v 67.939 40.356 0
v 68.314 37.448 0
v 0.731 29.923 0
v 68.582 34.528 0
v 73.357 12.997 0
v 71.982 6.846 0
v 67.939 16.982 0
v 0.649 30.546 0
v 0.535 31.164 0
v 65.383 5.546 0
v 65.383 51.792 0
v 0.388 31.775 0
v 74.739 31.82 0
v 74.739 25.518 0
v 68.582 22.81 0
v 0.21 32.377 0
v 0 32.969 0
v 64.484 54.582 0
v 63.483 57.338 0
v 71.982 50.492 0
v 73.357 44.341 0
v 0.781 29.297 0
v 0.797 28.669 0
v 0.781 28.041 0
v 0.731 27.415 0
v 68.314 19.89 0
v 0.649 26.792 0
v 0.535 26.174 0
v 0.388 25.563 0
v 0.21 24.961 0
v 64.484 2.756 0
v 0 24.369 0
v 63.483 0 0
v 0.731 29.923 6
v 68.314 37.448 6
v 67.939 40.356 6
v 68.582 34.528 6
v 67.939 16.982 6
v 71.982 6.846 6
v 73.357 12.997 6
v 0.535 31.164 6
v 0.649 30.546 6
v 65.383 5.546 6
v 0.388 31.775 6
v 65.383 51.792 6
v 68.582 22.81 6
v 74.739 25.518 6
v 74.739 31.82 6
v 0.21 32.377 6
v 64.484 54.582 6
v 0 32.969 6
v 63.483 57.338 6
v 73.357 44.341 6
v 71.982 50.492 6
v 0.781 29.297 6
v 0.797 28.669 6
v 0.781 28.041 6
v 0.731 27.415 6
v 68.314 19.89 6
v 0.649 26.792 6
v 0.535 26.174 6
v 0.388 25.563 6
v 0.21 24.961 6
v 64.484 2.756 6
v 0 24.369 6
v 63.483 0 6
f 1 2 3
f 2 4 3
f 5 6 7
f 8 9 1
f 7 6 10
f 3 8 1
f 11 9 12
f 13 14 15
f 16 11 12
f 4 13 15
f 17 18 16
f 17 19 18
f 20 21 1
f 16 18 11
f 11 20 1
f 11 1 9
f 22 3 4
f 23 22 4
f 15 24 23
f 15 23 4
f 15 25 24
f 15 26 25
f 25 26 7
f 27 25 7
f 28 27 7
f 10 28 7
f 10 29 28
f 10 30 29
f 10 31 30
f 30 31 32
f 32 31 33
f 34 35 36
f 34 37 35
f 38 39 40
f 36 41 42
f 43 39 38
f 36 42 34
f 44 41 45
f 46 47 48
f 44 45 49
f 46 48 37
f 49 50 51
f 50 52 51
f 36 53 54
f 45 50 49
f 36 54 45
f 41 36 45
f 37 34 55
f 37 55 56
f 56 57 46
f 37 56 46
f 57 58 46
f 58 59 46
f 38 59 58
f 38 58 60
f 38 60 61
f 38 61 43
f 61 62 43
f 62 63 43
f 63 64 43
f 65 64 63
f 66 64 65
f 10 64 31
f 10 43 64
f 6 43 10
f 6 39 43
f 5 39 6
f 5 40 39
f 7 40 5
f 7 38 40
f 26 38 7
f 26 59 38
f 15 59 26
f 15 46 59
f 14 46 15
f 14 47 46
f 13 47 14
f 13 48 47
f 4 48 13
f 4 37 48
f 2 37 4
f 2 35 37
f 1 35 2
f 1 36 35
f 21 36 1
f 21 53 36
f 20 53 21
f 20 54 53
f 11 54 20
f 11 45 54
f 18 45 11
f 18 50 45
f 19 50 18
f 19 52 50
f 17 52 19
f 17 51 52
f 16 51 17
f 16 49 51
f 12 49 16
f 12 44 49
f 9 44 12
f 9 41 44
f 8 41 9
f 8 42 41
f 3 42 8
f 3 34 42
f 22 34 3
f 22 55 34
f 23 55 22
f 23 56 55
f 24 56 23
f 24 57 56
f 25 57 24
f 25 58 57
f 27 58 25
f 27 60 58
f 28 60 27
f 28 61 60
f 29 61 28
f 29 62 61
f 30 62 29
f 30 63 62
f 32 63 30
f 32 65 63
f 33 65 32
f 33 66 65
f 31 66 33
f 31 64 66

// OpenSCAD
$fn = 32;

// ----------------------------------------------------------------------
// Gear sector: 3 teeth on 42 degrees
// ----------------------------------------------------------------------

// --- parameters (mm) ---
sector_angle = 42;        // sector angle, degrees
root_r = 80;              // root circle radius
tooth_h = 6;              // tooth height over the root circle
teeth = 3;                // number of teeth on the sector
hub_r = 12;               // hub bore radius
plate_t = 6;              // sector thickness, Z
arc_step = 3;             // sampling step of the root/hub arcs, degrees

tip_r = root_r + tooth_h;  // tip circle radius

profile = [[63.483, 0], [64.484, 2.756], [65.383, 5.546], [71.982, 6.846], [73.357, 12.997], [67.939, 16.982], [68.314, 19.89], [68.582, 22.81], [74.739, 25.518], [74.739, 31.82], [68.582, 34.528], [68.314, 37.448], [67.939, 40.356], [73.357, 44.341], [71.982, 50.492], [65.383, 51.792], [64.484, 54.582], [63.483, 57.338], [0, 32.969], [0.21, 32.377], [0.388, 31.775], [0.535, 31.164], [0.649, 30.546], [0.731, 29.923], [0.781, 29.297], [0.797, 28.669], [0.781, 28.041], [0.731, 27.415], [0.649, 26.792], [0.535, 26.174], [0.388, 25.563], [0.21, 24.961], [0, 24.369]];  // primary outline, 33 points, counter clockwise

// --- the one profile operation ---
linear_extrude(height = plate_t) polygon(points = profile);
